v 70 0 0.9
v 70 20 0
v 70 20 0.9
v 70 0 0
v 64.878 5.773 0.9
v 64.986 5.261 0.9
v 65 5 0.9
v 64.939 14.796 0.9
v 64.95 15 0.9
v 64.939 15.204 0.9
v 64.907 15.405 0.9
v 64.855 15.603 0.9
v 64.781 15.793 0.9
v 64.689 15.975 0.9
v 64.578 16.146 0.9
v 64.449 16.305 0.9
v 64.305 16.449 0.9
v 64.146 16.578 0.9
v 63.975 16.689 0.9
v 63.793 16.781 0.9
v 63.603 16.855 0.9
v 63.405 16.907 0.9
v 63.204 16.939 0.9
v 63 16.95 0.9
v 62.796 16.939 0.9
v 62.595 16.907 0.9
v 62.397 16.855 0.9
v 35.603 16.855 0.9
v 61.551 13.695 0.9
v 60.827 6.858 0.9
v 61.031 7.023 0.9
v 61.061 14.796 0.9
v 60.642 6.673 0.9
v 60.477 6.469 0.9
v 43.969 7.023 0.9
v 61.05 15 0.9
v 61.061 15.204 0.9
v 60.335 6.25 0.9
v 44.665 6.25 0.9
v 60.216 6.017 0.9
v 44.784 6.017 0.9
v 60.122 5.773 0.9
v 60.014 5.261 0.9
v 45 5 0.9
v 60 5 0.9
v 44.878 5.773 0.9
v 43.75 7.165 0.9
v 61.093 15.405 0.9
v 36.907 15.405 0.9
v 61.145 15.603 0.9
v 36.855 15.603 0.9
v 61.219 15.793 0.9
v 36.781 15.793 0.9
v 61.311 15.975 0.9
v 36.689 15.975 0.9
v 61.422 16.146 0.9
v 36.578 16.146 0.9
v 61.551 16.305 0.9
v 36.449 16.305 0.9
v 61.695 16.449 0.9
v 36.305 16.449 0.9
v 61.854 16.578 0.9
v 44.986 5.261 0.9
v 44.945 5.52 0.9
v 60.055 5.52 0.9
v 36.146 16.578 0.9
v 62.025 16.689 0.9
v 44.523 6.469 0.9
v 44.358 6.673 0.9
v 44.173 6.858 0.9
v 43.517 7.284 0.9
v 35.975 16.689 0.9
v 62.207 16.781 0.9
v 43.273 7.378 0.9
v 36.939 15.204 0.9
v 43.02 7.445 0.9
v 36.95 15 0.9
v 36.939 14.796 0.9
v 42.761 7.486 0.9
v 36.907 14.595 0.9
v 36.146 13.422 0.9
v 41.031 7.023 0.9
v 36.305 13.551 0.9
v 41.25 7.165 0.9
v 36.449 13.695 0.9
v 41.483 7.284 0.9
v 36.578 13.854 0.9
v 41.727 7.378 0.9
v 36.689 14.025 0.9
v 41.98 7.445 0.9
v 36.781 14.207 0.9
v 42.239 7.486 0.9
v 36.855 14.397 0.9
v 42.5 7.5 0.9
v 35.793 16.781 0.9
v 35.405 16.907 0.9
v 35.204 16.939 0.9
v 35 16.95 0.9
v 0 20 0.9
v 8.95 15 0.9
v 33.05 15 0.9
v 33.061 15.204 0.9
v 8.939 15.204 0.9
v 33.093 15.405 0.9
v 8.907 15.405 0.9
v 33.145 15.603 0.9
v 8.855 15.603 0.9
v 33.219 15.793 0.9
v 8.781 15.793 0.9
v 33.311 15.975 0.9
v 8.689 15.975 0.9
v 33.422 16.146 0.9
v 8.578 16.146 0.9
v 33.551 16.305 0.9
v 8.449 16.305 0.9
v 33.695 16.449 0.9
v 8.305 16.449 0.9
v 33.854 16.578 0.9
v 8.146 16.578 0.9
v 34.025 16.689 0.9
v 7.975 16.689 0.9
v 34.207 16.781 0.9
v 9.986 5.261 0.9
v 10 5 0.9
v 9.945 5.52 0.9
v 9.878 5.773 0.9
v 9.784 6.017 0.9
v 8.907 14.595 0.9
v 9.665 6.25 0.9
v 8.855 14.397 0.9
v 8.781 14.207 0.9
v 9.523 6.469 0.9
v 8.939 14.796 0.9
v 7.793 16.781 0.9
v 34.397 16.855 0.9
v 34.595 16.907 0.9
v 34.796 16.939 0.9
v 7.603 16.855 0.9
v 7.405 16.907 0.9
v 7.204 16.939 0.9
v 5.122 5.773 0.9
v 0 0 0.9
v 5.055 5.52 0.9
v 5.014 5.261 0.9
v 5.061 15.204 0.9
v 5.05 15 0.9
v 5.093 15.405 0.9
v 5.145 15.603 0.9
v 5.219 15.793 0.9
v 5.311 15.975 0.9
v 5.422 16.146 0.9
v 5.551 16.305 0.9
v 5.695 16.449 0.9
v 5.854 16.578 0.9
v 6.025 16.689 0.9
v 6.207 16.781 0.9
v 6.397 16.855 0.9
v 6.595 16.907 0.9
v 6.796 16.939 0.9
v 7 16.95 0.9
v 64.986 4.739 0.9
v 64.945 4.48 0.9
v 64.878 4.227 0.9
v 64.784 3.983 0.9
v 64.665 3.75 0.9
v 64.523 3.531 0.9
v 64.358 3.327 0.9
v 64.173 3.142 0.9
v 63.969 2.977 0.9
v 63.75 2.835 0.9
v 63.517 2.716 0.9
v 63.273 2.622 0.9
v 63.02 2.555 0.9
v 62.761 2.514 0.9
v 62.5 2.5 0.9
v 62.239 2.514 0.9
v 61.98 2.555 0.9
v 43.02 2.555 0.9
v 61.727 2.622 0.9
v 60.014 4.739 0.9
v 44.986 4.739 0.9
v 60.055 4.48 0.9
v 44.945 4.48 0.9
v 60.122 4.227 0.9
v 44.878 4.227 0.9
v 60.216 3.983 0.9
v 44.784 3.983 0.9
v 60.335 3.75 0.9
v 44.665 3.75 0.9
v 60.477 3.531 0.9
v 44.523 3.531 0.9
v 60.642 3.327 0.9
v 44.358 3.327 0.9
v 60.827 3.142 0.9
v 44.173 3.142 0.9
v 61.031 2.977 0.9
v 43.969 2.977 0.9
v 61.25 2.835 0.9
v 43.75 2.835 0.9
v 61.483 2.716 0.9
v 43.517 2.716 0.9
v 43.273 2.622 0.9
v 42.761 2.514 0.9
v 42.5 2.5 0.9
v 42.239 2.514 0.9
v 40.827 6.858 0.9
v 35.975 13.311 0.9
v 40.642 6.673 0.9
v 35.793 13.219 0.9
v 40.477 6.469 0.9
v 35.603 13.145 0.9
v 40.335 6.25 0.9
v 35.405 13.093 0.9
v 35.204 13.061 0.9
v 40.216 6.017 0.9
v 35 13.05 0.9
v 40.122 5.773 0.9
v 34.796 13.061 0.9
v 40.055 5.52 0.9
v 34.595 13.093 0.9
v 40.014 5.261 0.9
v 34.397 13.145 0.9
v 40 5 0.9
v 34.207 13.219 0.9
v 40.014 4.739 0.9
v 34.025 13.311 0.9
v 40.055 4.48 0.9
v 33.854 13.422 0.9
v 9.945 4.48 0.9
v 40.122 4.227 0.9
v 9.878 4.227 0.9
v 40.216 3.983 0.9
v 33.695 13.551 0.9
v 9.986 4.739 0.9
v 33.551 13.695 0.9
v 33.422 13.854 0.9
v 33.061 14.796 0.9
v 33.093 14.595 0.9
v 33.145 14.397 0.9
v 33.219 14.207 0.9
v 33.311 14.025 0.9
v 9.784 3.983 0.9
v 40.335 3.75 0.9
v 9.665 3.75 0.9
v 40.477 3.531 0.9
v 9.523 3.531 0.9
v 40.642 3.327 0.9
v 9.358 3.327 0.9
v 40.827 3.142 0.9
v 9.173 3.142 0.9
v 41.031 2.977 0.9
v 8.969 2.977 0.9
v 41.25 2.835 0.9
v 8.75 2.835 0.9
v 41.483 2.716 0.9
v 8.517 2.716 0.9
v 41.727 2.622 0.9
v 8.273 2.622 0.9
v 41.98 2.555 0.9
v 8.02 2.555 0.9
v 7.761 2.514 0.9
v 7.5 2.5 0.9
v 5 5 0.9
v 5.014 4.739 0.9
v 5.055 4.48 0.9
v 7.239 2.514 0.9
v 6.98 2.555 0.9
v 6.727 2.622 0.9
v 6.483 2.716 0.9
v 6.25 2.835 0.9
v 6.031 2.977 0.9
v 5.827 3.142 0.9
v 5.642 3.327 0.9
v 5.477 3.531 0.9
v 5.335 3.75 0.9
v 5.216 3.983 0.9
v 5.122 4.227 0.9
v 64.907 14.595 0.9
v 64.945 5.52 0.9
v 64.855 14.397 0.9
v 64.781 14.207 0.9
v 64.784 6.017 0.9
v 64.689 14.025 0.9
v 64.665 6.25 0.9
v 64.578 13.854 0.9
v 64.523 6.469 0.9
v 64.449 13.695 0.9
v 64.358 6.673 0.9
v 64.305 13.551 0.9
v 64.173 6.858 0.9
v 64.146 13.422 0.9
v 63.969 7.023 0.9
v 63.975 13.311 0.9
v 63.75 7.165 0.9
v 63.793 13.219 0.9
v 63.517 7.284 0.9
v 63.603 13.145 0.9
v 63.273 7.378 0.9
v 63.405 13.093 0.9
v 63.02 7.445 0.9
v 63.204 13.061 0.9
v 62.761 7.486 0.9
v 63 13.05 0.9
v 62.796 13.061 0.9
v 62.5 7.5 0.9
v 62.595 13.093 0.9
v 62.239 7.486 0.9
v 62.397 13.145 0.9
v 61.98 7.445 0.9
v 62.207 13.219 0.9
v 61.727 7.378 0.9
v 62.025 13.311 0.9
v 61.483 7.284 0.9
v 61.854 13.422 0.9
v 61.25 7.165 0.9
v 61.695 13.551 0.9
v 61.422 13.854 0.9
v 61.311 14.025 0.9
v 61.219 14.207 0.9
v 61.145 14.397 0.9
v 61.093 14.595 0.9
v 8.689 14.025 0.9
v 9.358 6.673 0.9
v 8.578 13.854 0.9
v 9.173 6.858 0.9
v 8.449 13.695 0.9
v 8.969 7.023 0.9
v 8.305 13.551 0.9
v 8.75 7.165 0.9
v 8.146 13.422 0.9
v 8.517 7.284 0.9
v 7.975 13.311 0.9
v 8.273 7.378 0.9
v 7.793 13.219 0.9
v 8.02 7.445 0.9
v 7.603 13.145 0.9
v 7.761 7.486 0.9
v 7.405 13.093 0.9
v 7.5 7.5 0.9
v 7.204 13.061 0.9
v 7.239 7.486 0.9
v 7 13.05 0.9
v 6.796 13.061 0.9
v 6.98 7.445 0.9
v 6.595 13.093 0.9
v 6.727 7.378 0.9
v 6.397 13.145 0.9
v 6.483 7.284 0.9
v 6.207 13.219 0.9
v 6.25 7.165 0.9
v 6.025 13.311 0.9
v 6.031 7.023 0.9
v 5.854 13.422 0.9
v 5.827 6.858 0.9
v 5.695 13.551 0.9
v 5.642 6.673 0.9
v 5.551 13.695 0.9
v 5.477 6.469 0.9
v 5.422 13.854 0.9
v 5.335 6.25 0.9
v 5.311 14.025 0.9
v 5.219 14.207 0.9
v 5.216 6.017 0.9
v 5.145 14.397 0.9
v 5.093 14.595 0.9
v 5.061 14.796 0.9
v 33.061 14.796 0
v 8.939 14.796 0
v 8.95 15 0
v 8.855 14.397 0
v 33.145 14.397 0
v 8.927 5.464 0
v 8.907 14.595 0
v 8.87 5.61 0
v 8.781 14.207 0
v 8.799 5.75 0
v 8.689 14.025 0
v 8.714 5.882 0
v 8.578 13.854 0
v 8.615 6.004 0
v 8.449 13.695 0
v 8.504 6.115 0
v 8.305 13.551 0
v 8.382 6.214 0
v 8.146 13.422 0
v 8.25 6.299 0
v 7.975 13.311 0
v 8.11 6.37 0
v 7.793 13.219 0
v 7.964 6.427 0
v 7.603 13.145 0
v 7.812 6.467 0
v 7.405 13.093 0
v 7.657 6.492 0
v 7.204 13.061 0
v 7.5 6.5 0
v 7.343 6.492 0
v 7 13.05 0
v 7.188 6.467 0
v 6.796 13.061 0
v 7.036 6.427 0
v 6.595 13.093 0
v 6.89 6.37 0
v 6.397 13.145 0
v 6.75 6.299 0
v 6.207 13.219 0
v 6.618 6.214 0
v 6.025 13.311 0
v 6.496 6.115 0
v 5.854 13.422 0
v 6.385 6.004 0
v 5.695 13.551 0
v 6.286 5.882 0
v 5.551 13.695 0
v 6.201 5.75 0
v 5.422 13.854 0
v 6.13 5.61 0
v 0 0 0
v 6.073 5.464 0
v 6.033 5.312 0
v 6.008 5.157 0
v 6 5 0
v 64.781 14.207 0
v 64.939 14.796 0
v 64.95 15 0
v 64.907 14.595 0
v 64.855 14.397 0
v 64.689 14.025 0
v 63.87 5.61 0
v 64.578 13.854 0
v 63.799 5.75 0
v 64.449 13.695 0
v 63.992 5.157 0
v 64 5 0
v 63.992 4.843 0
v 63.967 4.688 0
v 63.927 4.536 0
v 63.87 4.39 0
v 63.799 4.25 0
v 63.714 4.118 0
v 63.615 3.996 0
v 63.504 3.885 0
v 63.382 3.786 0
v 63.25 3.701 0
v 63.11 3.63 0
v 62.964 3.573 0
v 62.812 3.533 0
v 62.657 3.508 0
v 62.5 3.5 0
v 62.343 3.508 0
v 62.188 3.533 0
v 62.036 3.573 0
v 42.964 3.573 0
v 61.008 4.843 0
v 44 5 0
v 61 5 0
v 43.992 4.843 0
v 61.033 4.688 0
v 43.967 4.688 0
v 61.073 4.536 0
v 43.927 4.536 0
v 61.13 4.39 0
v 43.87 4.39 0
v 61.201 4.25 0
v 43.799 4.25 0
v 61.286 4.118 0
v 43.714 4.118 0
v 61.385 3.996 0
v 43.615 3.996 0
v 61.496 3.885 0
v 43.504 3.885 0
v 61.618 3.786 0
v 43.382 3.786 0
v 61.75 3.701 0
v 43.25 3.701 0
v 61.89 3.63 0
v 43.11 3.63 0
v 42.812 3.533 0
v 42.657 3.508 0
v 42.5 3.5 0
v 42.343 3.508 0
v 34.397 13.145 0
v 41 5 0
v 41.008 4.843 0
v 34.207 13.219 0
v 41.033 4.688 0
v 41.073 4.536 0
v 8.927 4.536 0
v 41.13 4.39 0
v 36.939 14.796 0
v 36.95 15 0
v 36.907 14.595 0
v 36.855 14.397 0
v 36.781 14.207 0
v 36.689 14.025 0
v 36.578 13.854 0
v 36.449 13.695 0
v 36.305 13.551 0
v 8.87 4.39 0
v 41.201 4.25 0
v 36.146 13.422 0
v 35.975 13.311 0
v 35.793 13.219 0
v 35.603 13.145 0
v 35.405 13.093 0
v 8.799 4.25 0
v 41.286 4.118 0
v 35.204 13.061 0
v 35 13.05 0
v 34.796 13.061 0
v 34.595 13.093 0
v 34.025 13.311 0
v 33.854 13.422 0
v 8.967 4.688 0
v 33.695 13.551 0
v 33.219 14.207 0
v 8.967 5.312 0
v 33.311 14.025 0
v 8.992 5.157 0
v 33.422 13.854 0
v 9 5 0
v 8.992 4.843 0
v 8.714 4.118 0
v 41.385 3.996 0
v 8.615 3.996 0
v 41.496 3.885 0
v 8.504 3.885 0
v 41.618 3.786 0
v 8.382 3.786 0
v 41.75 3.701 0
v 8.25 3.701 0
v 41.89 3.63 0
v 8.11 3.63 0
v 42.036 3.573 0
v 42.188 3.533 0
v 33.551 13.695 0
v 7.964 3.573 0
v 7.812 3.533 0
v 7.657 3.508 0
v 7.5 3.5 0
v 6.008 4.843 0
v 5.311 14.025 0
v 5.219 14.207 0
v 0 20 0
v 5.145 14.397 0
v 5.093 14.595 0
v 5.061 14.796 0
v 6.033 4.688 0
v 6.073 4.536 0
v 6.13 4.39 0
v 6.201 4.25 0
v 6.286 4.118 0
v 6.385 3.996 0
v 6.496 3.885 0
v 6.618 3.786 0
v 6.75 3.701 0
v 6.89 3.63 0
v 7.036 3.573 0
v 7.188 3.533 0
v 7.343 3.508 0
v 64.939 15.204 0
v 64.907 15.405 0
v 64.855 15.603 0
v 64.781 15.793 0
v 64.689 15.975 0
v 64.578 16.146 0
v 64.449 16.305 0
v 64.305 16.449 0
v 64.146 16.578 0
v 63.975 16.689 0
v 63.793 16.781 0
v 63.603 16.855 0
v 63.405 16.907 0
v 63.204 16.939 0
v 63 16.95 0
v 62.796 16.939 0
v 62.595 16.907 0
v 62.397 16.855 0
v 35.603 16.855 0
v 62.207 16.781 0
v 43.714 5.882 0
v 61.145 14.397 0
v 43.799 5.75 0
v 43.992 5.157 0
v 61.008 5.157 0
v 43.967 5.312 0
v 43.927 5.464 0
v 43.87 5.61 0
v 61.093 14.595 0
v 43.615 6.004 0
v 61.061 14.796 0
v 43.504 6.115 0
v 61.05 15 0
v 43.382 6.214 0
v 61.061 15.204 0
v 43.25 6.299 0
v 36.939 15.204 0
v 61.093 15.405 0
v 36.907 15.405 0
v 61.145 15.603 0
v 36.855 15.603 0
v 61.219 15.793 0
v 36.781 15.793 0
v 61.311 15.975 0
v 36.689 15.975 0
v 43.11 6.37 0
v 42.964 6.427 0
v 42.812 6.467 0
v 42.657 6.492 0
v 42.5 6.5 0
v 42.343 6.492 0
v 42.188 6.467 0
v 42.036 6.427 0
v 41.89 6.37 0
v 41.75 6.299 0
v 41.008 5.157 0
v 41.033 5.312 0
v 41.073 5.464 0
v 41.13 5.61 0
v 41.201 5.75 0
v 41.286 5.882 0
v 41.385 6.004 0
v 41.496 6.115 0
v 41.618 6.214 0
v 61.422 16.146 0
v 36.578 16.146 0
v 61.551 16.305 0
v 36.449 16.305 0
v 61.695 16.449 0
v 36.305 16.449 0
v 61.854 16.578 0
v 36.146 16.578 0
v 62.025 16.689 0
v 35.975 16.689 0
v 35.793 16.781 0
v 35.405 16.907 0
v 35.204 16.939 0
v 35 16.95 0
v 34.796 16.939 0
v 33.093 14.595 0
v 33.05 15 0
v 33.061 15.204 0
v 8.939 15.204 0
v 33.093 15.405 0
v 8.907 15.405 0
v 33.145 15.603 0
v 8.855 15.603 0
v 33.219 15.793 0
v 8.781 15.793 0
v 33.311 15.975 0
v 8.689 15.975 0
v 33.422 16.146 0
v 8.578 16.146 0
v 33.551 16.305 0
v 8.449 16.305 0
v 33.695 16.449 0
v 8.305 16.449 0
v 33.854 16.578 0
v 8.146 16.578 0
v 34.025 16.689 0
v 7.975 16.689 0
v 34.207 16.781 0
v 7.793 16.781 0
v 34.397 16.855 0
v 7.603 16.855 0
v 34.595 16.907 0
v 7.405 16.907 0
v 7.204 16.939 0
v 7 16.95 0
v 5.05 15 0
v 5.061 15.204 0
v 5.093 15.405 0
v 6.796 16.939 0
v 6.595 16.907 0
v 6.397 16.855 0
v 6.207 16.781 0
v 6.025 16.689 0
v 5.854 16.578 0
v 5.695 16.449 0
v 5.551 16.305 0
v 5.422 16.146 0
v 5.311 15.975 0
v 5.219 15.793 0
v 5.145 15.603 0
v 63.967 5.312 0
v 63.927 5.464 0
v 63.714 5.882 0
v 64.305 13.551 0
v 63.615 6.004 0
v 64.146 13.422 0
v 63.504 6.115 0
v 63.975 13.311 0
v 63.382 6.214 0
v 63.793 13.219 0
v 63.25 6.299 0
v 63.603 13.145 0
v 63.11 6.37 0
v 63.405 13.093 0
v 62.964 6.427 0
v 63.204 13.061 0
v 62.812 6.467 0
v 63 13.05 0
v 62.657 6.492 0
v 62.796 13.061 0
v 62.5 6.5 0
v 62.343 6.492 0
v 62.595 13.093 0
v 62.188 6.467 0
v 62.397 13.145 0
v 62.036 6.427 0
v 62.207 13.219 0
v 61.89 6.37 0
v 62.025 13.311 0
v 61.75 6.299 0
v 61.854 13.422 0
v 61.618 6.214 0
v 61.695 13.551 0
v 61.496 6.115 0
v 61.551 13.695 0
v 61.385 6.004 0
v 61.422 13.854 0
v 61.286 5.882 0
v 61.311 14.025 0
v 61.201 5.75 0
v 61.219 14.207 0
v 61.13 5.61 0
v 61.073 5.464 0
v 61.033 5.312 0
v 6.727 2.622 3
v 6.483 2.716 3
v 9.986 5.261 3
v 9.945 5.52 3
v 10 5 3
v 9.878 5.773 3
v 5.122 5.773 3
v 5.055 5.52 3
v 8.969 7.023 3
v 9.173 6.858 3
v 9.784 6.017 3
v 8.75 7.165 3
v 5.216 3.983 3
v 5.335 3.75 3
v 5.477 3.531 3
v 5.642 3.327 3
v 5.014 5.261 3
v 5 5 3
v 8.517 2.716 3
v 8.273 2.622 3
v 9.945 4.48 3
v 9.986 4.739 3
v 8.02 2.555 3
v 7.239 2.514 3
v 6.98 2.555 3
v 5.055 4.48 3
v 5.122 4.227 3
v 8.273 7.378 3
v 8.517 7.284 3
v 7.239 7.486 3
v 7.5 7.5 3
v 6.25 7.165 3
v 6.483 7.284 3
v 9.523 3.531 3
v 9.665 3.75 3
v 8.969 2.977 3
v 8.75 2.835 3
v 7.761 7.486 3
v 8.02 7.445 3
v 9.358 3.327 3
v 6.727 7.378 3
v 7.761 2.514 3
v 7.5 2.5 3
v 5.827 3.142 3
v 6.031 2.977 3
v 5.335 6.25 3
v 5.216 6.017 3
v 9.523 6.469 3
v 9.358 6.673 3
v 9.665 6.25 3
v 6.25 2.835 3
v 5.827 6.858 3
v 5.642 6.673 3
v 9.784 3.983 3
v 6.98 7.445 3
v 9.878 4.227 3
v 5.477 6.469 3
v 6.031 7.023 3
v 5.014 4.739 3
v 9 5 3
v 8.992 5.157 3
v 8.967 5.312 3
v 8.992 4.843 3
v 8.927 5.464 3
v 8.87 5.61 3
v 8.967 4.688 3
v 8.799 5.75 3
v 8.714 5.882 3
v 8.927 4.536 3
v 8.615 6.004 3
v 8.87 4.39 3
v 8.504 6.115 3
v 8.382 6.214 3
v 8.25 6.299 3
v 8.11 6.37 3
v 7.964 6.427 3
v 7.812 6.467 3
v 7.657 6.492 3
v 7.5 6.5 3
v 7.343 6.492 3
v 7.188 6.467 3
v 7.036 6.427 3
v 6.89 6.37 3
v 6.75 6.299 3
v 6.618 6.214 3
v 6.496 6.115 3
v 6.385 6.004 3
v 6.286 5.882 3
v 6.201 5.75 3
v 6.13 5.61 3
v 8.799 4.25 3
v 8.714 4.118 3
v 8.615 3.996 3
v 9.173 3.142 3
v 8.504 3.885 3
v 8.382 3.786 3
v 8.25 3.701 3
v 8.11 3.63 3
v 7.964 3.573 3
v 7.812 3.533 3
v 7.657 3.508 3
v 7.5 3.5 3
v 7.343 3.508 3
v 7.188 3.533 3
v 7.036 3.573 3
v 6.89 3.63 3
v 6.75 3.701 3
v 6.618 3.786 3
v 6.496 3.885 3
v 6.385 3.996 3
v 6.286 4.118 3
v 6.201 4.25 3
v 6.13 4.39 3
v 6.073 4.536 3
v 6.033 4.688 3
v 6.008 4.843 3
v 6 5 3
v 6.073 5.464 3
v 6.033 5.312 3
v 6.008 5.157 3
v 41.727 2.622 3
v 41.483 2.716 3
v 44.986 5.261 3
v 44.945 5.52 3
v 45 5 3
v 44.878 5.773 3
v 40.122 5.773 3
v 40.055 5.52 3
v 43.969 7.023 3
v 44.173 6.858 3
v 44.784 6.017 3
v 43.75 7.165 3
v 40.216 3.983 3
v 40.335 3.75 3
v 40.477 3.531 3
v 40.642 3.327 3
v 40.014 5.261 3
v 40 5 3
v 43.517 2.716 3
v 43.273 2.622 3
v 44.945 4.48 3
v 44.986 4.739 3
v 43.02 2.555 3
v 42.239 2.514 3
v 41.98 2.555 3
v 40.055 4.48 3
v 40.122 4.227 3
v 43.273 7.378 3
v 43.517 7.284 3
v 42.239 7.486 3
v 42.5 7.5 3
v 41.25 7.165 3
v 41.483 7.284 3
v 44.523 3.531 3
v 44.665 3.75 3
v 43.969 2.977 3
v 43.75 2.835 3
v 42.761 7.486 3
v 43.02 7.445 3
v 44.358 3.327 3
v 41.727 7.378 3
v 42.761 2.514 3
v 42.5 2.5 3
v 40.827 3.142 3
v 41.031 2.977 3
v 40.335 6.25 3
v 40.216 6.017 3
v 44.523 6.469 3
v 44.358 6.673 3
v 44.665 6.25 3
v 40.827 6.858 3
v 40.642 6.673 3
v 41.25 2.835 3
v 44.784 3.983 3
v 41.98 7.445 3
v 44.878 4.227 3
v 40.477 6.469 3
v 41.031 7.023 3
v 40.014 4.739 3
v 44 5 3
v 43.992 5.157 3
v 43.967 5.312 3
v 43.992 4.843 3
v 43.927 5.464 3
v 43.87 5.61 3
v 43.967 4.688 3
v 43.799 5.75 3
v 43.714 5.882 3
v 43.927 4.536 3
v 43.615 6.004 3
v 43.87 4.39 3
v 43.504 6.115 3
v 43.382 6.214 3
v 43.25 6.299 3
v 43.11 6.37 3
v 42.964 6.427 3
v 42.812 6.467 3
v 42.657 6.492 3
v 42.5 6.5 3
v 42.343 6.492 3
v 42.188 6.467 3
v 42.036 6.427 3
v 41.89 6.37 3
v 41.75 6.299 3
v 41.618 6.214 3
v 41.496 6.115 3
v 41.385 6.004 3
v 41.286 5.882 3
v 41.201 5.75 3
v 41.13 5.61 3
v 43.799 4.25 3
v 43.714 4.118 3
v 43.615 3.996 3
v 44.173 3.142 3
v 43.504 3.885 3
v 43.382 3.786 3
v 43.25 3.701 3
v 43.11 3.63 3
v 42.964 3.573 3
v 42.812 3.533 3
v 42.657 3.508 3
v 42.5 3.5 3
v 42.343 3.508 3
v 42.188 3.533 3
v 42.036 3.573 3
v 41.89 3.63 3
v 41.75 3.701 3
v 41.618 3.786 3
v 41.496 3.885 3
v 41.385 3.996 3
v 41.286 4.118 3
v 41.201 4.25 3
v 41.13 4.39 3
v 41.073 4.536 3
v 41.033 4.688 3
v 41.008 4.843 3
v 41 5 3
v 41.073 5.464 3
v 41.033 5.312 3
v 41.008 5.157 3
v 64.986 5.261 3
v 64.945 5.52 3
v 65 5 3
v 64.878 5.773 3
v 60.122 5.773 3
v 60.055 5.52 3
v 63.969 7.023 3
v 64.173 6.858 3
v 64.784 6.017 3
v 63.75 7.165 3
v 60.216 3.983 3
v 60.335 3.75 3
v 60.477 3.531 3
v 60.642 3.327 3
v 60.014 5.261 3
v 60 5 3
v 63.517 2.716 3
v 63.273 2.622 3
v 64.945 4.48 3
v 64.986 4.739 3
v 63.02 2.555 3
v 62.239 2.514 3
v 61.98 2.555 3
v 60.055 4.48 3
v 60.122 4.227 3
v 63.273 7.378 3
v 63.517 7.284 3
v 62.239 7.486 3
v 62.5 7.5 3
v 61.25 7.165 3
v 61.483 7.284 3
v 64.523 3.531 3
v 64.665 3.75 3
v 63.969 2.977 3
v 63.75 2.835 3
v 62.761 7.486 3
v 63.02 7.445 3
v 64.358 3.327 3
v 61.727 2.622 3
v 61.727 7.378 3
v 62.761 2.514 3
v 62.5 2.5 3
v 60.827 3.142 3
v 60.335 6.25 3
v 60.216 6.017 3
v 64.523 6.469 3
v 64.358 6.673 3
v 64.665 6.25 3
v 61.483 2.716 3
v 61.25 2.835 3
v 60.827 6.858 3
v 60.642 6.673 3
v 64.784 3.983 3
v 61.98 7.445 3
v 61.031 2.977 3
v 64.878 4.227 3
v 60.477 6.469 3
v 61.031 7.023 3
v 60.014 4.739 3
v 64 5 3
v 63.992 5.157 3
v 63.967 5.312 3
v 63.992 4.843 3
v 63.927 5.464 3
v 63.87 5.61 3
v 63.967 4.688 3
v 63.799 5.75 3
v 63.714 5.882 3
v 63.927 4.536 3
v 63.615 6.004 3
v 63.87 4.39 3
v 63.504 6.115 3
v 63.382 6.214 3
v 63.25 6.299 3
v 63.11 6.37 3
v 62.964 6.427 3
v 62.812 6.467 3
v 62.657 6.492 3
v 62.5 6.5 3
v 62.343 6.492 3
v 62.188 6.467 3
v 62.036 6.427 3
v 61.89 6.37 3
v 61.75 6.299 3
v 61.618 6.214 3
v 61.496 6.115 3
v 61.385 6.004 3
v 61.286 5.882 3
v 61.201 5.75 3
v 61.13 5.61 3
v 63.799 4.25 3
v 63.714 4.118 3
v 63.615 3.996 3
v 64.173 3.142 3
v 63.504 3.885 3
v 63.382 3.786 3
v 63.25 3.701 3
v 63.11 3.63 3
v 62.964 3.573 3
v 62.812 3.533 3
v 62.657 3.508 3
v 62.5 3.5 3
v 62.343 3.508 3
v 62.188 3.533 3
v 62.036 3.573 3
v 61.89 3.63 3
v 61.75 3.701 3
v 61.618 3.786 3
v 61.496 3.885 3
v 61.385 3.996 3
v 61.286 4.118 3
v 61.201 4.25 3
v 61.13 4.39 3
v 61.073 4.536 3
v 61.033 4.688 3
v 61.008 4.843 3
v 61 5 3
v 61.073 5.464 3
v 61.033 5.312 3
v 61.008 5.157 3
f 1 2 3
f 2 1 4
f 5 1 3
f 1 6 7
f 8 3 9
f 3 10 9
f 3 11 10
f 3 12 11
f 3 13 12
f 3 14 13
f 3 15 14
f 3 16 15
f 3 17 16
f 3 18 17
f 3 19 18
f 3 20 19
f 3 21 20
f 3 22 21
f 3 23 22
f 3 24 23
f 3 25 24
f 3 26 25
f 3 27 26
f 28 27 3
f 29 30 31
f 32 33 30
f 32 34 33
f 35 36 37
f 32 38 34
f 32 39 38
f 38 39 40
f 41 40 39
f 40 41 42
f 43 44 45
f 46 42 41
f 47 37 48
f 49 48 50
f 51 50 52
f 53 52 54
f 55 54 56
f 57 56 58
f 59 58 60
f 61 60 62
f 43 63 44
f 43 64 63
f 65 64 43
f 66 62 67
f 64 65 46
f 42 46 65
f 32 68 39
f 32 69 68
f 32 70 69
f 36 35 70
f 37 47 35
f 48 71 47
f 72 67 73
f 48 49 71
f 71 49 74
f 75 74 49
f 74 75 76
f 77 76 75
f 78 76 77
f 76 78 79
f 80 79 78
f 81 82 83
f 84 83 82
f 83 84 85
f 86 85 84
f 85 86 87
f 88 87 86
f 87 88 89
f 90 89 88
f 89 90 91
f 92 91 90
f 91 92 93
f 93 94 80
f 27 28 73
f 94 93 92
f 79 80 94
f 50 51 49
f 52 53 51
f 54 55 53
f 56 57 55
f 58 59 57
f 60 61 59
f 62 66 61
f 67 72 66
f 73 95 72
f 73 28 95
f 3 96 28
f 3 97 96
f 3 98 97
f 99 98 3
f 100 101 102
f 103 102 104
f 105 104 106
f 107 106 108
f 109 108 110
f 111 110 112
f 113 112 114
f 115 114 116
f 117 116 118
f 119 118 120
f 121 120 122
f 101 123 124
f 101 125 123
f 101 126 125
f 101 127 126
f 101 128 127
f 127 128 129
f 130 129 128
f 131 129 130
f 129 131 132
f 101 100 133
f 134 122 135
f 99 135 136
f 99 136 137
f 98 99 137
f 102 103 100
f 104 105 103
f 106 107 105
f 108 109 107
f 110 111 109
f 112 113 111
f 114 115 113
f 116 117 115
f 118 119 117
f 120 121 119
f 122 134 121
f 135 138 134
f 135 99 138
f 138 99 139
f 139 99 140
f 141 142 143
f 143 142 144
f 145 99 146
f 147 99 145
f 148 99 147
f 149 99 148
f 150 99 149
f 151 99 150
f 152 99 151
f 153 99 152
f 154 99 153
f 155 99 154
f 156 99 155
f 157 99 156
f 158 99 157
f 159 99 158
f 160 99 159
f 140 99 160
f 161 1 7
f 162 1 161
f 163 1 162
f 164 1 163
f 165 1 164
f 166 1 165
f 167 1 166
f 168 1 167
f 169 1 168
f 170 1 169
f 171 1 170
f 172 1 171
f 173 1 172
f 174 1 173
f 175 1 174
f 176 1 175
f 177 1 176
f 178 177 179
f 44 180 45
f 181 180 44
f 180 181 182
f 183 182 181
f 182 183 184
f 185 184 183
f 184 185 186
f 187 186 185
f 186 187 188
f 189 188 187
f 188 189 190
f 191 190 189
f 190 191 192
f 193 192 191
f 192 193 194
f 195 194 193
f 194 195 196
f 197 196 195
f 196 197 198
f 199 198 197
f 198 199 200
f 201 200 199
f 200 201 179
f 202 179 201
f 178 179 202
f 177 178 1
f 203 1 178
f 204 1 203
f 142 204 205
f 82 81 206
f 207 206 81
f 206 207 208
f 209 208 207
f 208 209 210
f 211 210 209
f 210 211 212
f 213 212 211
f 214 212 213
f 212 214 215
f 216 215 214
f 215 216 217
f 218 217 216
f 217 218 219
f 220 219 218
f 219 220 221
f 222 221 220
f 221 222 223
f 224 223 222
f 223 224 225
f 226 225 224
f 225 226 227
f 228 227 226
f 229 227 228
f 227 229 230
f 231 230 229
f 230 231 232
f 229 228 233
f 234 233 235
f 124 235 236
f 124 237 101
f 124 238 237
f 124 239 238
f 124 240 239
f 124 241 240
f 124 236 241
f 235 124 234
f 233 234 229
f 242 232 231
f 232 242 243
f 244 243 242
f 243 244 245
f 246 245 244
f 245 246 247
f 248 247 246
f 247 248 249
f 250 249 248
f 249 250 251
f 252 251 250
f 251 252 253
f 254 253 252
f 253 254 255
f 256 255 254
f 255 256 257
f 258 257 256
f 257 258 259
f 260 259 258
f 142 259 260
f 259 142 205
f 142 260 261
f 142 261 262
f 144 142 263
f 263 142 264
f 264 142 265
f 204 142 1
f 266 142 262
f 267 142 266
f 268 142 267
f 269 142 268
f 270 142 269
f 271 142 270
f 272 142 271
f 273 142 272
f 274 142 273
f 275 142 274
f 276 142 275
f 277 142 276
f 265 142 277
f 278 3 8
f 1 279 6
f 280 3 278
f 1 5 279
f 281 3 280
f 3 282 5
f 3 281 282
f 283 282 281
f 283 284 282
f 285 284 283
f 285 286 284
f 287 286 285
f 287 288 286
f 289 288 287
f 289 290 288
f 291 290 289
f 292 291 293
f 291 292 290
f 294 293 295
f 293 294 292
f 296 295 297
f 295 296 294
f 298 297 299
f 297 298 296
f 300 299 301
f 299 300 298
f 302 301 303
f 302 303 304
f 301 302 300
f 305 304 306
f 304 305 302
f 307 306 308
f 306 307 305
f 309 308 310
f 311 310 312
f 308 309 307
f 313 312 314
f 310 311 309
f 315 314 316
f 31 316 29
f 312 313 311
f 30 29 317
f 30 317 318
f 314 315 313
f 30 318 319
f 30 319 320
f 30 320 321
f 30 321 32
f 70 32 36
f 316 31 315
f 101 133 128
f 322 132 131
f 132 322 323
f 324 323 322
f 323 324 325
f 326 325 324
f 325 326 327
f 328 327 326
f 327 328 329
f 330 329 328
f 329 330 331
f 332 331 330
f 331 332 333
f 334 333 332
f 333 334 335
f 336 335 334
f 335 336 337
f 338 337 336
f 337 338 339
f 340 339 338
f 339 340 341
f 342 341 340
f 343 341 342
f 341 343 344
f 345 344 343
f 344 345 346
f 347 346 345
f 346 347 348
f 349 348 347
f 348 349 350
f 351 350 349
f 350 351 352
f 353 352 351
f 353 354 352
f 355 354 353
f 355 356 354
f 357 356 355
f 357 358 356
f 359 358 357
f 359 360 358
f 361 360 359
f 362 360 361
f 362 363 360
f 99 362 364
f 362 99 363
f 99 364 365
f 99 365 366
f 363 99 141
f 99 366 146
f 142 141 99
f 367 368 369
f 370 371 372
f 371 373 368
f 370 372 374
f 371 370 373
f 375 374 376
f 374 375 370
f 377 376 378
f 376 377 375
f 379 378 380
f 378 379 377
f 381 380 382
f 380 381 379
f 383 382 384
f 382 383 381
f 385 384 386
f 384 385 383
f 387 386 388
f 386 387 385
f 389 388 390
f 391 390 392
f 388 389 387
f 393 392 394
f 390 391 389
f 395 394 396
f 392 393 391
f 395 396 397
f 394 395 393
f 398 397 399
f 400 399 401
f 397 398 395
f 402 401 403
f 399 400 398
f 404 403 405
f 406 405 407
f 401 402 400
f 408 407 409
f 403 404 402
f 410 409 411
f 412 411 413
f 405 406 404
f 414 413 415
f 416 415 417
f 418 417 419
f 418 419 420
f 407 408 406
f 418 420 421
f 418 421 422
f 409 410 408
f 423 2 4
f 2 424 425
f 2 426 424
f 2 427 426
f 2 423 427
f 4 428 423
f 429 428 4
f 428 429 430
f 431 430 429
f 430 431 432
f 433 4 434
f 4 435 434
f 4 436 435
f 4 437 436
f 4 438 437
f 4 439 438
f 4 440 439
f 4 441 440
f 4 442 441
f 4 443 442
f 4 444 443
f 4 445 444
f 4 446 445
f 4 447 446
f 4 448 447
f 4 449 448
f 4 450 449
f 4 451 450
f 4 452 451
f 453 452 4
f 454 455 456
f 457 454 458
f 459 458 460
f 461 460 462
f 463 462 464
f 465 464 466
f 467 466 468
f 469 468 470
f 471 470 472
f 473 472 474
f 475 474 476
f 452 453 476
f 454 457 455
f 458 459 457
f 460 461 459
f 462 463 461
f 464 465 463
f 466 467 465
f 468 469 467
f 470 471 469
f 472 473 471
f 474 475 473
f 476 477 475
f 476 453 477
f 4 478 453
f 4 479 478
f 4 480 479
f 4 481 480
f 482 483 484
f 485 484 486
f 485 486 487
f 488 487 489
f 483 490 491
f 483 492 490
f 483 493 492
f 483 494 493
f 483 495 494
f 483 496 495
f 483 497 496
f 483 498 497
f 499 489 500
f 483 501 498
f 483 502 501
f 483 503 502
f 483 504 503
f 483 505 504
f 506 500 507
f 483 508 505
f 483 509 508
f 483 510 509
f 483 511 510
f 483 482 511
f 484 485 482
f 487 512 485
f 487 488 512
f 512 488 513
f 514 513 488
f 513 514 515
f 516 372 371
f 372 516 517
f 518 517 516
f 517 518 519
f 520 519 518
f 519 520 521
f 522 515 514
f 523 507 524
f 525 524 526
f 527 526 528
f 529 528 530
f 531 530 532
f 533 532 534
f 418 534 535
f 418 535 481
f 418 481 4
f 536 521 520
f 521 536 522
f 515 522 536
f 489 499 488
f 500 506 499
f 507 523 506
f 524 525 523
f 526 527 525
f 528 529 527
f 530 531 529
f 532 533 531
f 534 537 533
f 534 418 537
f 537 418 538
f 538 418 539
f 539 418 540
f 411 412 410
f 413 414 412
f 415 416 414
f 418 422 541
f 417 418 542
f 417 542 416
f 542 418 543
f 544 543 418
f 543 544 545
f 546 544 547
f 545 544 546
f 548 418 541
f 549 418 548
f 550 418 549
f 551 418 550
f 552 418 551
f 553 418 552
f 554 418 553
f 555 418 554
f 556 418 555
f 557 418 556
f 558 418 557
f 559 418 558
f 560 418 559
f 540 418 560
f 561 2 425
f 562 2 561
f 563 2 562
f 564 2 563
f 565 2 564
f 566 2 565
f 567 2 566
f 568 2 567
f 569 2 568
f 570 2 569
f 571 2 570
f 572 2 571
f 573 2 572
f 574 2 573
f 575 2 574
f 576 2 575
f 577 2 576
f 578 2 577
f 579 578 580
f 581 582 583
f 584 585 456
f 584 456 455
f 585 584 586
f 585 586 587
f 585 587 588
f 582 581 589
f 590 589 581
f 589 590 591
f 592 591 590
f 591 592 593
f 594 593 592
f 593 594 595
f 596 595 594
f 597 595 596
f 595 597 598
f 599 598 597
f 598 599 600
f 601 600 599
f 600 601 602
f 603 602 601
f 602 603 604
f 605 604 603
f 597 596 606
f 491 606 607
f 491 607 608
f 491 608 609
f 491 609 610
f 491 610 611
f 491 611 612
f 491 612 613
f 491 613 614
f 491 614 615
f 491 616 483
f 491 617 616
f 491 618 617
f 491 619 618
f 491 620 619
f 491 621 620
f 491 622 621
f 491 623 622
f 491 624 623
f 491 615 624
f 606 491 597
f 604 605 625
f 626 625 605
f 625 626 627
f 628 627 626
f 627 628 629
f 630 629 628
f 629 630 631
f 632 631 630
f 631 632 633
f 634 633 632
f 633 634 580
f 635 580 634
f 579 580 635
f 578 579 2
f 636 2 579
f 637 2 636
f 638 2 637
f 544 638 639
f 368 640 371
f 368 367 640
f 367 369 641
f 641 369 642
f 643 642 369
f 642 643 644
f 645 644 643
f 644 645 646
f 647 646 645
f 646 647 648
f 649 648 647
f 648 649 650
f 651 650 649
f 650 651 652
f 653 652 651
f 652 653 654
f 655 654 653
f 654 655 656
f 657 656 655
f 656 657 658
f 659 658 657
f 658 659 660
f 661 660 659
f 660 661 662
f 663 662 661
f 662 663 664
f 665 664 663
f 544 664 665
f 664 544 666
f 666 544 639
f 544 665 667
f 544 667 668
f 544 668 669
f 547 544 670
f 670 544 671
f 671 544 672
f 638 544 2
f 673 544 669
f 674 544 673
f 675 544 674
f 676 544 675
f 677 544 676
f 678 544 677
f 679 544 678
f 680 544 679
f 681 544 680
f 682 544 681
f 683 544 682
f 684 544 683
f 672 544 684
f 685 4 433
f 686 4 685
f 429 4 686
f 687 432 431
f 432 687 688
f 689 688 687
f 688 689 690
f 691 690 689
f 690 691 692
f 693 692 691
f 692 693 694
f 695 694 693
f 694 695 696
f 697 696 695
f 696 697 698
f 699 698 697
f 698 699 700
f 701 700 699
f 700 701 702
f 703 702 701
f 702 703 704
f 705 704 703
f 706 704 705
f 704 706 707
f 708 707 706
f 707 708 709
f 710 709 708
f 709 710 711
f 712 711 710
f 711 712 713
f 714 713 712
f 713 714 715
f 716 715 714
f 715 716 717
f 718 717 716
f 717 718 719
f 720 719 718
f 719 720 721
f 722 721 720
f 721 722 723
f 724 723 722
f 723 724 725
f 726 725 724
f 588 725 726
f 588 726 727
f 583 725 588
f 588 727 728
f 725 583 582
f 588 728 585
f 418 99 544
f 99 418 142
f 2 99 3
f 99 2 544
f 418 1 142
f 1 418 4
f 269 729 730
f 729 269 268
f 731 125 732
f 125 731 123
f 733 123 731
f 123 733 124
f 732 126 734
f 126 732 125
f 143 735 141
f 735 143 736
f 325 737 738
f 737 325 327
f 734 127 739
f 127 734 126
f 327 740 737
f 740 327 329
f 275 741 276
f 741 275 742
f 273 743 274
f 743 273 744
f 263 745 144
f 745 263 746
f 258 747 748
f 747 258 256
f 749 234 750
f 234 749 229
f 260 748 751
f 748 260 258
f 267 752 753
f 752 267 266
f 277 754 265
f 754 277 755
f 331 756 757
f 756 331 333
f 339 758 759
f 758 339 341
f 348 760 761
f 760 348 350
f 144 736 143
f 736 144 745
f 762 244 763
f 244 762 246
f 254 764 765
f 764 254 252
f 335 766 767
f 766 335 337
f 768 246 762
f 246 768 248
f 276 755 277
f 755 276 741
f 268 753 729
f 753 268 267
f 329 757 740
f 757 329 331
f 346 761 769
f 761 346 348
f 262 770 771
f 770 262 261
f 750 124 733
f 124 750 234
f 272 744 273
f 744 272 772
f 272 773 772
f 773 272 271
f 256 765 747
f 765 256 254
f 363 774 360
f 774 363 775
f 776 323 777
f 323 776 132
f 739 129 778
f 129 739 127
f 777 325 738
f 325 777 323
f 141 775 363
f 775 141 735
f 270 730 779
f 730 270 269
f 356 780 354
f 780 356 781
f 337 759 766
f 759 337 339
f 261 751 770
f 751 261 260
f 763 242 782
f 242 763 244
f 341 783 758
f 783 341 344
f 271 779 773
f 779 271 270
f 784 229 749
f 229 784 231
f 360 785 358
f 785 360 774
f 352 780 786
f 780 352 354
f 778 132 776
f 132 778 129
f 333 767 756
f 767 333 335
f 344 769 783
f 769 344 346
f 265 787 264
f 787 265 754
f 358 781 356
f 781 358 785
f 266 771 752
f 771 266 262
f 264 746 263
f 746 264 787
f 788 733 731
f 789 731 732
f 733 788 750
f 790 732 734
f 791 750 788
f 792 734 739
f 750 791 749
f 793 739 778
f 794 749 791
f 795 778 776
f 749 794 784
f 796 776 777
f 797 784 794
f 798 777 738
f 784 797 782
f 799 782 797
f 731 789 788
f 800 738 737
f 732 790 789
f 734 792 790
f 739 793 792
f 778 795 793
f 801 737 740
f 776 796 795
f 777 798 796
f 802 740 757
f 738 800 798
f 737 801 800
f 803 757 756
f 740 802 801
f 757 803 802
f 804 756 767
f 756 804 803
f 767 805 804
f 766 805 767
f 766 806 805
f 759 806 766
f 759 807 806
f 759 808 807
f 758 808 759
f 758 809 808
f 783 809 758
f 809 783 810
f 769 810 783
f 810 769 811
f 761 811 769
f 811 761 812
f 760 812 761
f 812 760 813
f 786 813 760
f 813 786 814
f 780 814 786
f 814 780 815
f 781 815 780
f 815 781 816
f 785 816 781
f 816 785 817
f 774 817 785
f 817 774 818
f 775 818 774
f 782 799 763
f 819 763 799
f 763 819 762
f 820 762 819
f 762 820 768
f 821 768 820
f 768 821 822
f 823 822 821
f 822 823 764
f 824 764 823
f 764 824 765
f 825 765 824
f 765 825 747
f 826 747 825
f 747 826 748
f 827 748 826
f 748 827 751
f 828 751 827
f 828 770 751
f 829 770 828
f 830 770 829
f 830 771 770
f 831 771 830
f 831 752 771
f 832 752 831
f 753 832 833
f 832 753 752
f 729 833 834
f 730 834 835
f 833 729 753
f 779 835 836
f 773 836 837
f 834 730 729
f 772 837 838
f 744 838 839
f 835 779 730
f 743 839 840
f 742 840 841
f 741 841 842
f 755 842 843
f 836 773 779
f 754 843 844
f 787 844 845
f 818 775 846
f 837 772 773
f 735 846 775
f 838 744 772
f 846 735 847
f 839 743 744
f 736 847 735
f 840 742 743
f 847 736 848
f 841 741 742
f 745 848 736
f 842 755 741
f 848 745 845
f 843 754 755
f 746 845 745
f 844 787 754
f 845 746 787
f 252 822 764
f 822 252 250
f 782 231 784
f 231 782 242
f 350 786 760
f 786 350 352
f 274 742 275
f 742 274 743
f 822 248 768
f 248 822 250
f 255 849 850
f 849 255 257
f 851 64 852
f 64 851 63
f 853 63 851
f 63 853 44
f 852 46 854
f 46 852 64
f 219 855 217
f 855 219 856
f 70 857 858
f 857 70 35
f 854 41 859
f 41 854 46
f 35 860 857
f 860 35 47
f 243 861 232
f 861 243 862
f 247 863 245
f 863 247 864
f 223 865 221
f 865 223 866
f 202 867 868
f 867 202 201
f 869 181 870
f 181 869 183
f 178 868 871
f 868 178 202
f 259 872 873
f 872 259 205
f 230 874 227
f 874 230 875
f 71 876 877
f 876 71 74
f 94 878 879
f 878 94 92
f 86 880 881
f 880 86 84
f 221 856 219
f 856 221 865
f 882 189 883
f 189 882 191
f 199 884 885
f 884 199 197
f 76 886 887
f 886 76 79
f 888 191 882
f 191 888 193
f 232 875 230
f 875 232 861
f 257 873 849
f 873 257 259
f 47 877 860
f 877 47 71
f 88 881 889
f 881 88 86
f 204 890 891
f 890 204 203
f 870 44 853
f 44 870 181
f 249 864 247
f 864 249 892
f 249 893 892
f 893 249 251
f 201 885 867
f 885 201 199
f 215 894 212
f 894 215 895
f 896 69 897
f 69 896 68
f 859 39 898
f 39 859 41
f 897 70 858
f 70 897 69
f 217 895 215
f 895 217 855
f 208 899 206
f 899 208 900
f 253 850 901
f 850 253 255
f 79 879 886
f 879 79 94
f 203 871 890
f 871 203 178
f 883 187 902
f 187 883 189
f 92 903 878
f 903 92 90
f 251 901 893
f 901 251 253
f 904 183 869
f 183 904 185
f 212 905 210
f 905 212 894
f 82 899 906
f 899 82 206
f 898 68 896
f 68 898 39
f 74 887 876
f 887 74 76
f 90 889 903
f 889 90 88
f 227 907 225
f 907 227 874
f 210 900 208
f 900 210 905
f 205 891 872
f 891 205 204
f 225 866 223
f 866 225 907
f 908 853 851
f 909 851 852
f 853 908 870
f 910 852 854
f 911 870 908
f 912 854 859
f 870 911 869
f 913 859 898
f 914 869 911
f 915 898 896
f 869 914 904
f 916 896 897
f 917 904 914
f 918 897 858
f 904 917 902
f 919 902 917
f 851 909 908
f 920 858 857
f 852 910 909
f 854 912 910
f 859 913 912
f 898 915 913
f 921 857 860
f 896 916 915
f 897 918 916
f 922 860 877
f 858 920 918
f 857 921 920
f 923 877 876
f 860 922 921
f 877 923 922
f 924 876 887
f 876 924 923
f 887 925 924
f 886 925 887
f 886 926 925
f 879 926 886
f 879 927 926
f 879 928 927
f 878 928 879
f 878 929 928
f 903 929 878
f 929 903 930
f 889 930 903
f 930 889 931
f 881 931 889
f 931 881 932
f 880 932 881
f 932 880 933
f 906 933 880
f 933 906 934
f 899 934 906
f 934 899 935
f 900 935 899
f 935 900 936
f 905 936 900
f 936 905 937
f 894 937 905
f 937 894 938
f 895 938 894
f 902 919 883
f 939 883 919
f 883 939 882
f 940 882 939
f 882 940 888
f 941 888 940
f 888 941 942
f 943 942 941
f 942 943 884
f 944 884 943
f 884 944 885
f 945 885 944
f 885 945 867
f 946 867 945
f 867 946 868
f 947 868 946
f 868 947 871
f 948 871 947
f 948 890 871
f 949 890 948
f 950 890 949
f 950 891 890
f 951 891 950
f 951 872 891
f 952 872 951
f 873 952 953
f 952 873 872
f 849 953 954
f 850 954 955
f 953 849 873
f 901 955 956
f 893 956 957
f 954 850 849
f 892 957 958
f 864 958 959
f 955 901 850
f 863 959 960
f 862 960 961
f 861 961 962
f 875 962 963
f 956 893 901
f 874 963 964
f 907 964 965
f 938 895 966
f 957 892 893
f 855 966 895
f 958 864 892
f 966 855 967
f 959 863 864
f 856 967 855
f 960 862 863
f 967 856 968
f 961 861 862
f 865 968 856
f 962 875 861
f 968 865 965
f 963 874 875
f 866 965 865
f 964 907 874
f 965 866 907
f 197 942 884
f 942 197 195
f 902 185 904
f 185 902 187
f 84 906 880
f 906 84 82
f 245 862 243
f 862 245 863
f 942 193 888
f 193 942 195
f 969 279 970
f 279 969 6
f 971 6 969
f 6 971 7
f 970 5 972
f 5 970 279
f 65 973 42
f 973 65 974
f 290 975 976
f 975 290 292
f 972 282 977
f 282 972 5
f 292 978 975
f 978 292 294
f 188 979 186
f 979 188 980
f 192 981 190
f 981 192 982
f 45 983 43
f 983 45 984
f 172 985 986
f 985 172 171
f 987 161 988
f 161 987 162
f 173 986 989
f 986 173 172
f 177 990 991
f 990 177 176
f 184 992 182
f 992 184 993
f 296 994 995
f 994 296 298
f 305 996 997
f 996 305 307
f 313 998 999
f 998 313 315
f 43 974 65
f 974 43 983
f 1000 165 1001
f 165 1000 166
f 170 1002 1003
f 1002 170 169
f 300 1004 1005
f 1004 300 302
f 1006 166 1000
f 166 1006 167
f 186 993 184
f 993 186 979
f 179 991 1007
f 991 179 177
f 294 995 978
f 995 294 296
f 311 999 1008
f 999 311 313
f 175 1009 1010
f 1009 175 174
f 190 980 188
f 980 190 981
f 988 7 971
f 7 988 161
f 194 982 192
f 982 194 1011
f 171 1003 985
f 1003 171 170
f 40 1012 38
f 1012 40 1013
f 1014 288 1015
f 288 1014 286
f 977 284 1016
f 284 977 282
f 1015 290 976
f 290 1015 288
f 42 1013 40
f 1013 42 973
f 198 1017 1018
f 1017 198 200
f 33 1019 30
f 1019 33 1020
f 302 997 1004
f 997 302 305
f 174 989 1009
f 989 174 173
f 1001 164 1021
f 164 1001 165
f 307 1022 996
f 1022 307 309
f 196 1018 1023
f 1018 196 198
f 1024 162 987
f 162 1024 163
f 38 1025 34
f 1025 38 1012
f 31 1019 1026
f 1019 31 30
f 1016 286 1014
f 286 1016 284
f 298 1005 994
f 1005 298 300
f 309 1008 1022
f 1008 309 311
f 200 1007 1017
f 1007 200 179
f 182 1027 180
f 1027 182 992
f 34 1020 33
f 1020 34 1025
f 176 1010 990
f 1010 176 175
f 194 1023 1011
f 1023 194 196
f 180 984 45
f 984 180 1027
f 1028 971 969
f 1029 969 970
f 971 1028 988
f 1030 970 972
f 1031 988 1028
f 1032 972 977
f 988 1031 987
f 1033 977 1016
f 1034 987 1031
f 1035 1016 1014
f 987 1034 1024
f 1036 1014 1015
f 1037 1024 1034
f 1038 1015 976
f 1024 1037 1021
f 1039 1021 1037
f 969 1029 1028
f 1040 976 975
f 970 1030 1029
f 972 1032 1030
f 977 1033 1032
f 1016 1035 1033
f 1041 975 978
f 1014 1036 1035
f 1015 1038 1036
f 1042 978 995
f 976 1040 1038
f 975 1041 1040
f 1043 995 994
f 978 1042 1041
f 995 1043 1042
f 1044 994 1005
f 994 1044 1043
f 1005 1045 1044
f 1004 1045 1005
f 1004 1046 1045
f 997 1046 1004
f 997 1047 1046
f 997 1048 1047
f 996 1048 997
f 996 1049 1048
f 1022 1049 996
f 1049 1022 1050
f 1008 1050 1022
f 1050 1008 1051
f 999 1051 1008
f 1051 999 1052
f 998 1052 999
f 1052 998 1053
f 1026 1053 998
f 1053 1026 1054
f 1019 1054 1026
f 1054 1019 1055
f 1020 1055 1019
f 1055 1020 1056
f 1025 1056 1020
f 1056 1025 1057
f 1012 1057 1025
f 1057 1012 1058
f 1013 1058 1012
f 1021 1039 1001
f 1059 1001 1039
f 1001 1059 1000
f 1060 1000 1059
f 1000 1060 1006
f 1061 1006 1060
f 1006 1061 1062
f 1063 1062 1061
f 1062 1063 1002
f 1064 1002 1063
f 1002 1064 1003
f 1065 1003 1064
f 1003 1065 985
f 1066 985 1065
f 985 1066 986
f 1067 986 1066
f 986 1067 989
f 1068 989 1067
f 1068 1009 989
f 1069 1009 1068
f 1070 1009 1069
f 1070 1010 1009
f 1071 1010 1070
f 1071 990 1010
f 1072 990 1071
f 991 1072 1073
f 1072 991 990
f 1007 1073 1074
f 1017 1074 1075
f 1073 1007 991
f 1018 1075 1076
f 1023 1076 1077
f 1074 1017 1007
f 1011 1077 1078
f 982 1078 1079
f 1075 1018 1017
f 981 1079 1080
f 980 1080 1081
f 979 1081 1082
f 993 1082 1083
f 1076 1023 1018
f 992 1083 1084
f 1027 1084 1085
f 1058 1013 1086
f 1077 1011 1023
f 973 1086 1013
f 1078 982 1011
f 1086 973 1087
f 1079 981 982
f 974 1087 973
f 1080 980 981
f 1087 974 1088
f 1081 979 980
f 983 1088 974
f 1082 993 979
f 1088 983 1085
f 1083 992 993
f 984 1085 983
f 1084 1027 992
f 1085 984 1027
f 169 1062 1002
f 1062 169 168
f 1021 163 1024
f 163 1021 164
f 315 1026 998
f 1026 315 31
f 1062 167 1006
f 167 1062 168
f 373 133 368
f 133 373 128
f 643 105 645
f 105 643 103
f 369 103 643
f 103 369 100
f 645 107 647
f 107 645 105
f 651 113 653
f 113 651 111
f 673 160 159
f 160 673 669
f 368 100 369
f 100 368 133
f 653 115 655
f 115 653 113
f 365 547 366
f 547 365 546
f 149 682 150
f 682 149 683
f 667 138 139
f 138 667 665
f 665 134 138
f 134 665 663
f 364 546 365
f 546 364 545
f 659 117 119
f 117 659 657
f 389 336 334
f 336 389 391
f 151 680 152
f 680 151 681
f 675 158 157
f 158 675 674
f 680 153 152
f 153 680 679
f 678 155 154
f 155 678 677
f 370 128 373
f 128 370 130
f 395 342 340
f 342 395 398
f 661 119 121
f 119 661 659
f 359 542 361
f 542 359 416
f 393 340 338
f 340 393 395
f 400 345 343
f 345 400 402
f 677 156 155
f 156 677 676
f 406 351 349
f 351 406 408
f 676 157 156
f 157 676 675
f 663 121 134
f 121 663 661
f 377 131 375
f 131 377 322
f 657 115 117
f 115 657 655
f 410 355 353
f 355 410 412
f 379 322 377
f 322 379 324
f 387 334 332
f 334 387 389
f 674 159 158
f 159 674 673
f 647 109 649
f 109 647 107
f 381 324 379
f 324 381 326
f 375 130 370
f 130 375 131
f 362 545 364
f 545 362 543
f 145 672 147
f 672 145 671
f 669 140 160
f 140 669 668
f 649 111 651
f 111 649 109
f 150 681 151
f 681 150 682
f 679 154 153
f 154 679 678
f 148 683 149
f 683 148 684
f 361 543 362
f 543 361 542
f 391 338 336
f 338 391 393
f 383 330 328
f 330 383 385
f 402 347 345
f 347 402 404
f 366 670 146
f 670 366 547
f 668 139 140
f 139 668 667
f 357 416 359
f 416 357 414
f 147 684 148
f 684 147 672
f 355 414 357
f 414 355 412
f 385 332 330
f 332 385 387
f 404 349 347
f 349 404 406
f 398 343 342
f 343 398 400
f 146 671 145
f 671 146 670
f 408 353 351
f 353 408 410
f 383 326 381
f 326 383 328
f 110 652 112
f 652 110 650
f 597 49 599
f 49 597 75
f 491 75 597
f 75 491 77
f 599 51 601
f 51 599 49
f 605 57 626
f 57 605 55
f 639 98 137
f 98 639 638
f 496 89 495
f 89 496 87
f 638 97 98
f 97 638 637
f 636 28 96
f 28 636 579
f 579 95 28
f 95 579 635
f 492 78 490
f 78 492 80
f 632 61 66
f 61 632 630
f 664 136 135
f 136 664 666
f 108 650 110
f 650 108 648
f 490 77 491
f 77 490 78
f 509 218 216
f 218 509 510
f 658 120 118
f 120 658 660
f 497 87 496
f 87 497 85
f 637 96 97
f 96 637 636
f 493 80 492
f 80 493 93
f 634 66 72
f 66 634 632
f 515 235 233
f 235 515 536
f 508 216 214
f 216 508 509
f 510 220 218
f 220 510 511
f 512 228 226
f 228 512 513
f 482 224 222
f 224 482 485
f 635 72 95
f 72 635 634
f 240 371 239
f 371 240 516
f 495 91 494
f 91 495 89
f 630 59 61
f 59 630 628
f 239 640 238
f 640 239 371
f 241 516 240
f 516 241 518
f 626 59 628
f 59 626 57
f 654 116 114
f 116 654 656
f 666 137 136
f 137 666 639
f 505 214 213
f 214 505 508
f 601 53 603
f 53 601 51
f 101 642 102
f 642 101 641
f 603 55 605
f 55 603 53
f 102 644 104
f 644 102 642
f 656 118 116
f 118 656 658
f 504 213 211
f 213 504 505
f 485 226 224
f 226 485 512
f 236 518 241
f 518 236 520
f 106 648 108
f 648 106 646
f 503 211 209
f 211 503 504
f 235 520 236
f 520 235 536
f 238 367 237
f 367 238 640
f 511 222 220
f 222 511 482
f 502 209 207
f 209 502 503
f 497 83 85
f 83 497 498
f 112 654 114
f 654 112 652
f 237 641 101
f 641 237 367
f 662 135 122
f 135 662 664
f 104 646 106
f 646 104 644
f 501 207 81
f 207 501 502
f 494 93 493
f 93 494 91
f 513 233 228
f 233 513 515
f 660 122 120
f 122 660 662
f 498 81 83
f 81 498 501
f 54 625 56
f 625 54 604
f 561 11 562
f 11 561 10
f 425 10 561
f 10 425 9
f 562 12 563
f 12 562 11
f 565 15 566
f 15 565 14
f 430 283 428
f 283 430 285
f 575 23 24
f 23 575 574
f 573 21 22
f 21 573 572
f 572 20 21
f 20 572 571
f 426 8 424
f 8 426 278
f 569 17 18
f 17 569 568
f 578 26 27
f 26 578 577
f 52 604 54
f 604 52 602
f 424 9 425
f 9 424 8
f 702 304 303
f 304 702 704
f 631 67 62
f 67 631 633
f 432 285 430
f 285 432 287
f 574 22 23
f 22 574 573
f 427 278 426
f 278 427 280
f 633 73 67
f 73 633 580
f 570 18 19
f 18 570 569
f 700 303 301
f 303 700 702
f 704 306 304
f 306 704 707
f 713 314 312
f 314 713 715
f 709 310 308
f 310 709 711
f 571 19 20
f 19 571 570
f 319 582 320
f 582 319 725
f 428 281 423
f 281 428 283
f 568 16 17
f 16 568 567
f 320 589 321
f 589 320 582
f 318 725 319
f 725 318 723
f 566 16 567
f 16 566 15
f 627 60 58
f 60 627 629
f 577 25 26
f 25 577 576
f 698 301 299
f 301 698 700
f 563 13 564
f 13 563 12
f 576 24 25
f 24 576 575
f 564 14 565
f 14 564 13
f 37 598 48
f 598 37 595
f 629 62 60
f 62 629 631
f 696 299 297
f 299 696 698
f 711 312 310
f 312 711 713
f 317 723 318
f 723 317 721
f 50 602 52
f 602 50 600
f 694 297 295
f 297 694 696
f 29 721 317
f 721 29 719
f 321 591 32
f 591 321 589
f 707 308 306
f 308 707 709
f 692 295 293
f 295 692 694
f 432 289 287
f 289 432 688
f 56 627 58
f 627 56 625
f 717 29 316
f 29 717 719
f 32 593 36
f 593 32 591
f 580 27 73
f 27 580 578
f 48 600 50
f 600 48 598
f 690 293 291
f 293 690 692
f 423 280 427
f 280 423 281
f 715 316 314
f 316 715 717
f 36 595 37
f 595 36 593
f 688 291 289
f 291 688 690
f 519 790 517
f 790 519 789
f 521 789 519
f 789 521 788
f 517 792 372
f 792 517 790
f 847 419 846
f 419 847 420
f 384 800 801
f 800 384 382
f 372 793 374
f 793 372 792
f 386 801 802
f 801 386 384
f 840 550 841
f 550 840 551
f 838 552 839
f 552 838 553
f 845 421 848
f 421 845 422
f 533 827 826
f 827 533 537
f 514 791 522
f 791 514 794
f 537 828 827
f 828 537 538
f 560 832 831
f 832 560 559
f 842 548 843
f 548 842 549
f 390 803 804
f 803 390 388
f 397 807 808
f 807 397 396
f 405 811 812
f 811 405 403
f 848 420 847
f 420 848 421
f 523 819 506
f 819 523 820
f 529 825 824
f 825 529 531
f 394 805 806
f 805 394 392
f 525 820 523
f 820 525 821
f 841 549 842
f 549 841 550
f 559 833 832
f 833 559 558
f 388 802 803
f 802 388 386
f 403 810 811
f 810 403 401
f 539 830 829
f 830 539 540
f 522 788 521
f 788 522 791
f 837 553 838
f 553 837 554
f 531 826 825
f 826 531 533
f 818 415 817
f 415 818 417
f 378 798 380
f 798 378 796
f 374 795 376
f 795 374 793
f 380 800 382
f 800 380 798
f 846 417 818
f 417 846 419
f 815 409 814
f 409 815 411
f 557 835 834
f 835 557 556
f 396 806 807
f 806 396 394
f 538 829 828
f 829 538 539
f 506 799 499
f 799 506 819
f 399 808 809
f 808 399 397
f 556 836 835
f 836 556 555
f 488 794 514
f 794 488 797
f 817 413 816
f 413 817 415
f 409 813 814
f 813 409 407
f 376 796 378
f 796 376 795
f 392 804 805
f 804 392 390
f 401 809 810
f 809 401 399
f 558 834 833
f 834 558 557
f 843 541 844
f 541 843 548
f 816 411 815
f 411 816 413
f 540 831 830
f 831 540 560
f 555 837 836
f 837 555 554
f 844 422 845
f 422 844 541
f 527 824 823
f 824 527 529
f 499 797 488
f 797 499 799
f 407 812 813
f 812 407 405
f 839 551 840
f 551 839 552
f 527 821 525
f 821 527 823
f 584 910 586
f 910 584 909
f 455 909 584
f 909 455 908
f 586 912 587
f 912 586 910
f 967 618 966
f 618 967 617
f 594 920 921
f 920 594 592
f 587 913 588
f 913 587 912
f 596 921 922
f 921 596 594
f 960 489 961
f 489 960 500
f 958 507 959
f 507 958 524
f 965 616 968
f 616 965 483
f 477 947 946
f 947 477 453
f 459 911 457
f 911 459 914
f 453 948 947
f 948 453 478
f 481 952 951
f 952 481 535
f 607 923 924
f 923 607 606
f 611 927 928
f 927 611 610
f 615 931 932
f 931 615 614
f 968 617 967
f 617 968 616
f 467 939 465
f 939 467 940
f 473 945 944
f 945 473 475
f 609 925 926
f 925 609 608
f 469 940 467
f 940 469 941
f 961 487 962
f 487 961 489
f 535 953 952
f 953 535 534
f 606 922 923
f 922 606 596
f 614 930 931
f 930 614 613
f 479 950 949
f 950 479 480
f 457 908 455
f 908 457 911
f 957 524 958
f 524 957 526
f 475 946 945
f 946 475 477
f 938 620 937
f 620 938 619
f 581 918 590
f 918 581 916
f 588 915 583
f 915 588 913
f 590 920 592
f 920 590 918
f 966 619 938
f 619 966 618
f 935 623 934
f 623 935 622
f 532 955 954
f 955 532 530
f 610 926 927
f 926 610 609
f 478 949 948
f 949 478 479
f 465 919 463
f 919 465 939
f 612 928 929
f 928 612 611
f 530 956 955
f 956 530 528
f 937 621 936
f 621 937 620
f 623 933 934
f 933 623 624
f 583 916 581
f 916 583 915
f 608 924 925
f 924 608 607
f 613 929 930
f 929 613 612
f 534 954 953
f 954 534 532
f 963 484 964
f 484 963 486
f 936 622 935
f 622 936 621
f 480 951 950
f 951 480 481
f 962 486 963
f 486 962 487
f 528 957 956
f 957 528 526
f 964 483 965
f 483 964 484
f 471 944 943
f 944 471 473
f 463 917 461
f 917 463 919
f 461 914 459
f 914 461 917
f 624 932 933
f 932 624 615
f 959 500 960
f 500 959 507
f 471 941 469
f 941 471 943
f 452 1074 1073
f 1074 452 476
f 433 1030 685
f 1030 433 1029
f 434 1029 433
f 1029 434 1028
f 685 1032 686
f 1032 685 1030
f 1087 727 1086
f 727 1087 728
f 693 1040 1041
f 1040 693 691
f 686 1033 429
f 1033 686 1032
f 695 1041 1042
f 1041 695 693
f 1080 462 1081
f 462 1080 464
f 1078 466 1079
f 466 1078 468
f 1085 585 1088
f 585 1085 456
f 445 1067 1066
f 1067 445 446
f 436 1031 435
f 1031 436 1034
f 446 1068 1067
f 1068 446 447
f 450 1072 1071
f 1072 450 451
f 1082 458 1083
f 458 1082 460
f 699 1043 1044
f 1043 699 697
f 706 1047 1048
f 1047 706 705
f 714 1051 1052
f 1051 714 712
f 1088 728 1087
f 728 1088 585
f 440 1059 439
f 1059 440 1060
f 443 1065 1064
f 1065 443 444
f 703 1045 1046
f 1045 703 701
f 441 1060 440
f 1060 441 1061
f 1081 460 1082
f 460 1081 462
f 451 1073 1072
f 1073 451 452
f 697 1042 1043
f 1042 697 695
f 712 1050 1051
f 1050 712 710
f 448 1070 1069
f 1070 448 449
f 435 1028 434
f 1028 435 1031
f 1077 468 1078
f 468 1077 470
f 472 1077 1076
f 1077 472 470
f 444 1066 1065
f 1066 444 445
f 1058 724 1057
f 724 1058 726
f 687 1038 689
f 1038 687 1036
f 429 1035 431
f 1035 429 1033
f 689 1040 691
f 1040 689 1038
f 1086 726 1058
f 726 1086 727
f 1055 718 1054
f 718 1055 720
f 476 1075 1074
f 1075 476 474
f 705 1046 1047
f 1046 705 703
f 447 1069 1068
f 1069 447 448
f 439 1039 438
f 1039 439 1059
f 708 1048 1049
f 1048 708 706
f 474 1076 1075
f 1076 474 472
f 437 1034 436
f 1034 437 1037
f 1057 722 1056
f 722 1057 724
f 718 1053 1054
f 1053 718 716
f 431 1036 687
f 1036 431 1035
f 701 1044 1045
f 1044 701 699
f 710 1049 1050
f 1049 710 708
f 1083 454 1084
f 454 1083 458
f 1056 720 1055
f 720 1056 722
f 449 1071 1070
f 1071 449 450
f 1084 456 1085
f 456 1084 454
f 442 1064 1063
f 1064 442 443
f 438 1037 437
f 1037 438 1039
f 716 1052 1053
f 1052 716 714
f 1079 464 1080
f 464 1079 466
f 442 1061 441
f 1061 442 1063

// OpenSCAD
$fn = 60; //details

x0 = 7;
ox = 2.5;
o60 = 60;
o40 = 40;

module boff_holes3() {
    translate([x0,15,-1]) {
    cylinder(d=3.9,20);
    translate([28,0,0]) cylinder(d=3.9,h=20);
    translate([28+28,0,0]) cylinder(d=3.9,h=20);
    }
    translate([ox+5,5,0]) cylinder(d=3,h=5);
    translate([ox+o40,5,0]) cylinder(d=3,h=5);
    translate([ox+o60,5,0]) cylinder(d=3,h=5);

    
}

module boff0() {
    difference(){
    union(){
         cube([70,20,0.9]);
         translate([ox+5,5,0]) cylinder(d=5,h=3);
        translate([ox+o40,5,0]) cylinder(d=5,h=3);
         translate([ox+o60,5,0]) cylinder(d=5,h=3);
    }
        
    boff_holes3();
    }   
}
    
    
boff0();
